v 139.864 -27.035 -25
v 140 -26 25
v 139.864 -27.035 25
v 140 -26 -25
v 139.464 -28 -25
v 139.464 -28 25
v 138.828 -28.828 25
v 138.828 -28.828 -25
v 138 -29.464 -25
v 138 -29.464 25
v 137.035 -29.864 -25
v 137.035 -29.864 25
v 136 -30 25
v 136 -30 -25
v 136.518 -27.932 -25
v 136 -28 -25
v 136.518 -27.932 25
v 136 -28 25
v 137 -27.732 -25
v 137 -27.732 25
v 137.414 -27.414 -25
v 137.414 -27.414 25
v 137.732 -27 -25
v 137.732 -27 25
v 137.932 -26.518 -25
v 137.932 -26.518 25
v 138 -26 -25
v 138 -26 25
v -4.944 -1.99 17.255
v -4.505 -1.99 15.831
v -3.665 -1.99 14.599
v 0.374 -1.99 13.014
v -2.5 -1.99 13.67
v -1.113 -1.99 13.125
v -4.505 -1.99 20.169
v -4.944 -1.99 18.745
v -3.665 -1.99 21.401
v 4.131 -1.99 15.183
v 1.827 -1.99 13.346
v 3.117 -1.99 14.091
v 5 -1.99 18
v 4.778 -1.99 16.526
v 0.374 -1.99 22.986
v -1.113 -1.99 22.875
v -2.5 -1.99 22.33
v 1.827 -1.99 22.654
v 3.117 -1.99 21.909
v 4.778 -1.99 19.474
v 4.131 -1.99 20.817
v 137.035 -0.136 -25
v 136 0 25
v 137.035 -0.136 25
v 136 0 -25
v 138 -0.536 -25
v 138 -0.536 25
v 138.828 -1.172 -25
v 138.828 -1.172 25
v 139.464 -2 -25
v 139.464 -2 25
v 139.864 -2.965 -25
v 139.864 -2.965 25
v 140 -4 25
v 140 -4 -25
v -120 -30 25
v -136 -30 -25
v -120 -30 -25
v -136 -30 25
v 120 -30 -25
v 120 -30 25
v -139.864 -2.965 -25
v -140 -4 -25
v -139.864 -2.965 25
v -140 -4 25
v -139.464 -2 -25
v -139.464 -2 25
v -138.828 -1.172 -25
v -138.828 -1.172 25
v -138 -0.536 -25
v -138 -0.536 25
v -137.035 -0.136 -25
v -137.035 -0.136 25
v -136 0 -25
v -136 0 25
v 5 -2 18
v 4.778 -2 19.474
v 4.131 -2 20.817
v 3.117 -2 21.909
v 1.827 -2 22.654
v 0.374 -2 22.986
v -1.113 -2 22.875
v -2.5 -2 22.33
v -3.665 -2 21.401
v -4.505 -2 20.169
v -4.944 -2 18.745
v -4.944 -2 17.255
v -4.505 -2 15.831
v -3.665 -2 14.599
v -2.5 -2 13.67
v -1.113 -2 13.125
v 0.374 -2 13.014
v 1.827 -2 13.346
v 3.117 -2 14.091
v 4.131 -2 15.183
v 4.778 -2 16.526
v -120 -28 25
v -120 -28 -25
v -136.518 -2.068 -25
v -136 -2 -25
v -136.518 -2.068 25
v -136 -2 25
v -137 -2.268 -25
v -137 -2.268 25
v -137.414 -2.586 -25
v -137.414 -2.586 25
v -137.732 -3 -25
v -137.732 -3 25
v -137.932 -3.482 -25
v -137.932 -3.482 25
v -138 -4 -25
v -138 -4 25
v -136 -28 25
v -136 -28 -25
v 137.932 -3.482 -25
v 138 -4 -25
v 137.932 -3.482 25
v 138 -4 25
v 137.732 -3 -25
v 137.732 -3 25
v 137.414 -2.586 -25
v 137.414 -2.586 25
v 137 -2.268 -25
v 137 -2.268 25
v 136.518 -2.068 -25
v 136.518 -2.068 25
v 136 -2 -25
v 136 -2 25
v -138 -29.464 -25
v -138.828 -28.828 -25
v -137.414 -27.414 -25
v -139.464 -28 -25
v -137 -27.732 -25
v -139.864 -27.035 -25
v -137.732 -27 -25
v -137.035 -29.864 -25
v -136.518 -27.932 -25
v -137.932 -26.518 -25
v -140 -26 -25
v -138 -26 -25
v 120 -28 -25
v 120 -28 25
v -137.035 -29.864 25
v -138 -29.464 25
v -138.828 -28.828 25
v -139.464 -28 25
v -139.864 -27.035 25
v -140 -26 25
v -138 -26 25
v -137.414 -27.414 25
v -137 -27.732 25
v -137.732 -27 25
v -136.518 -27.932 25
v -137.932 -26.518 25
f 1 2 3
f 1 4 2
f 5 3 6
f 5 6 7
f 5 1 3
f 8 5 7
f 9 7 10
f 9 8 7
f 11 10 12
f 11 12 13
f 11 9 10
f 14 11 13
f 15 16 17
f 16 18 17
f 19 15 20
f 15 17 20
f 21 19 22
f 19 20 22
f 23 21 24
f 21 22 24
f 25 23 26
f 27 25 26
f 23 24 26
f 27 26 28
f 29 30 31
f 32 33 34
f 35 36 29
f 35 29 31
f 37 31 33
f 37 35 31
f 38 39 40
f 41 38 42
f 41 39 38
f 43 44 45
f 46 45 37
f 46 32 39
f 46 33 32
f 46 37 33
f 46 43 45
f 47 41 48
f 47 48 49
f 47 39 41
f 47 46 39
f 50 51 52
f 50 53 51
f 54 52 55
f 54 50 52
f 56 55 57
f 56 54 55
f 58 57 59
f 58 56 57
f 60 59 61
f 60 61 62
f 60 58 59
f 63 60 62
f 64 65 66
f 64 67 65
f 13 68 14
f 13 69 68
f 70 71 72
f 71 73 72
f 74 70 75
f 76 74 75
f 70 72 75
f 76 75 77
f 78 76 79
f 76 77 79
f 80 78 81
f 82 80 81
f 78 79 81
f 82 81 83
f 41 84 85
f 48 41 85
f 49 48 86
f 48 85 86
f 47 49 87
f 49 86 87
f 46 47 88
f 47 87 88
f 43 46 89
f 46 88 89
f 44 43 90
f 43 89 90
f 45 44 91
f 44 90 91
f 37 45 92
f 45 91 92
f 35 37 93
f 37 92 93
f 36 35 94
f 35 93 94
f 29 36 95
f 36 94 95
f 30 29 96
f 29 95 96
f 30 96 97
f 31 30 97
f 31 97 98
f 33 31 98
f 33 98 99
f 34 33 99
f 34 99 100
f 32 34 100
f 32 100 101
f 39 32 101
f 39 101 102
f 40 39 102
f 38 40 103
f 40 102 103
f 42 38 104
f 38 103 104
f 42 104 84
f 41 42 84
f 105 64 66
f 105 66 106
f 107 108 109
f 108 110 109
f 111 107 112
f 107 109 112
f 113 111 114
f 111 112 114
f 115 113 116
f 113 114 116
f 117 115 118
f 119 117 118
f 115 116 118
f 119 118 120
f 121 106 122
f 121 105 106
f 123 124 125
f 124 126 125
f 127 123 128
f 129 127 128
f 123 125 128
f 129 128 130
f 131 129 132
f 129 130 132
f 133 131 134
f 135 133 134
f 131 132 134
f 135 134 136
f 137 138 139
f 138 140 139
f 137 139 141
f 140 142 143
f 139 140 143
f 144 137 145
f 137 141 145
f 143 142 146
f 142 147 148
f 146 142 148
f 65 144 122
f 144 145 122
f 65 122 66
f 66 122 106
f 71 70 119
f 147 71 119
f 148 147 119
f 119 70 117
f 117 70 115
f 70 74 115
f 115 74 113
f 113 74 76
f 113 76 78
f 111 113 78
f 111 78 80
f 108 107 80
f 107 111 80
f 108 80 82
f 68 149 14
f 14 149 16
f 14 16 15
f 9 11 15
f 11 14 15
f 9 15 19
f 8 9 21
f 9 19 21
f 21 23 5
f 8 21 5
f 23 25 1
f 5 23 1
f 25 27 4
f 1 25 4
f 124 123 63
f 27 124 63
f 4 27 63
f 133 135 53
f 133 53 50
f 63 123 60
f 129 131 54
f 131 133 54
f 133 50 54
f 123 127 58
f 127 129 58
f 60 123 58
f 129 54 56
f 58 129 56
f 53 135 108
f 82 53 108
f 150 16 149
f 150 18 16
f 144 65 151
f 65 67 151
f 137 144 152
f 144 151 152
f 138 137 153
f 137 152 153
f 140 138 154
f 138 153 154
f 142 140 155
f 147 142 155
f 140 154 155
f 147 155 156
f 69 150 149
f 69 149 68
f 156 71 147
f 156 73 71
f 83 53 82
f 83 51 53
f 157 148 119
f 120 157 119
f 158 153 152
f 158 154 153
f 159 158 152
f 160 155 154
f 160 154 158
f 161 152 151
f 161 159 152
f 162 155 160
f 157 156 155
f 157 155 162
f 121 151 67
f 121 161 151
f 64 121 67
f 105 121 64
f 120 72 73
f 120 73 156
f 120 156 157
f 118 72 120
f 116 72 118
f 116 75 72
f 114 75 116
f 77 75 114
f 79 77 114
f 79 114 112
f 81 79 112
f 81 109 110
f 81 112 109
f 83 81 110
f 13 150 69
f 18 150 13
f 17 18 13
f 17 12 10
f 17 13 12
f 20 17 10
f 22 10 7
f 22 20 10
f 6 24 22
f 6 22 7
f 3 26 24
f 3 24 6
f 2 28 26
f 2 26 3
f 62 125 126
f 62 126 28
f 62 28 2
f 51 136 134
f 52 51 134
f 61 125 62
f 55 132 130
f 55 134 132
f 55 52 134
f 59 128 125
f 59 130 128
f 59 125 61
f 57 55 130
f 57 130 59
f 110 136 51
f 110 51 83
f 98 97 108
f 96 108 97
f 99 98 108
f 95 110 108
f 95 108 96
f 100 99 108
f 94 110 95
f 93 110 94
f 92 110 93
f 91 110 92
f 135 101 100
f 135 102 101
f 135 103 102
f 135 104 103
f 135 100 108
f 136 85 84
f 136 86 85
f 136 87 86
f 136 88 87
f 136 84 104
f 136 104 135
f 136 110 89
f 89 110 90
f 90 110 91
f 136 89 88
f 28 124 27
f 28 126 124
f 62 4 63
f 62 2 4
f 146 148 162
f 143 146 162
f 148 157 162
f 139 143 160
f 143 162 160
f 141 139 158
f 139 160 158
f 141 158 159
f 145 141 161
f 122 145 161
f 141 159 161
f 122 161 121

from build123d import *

# Parameters (mm, degrees)
F1_DEPTH = 25
F2_R     = 2
F3_R     = 4
F4_R     = 5
F5_DEPTH = 0.01


with BuildPart() as f1:
    # F0 (on Top) → F1 (new body, symmetric)
    with BuildSketch(Plane.XY):
        Polygon((140, 0), (0, 0), (-140, 0), (-140, -30), (-120, -30), (-120, -28), (-138, -28), (-138, -2), (0, -2), (138, -2), (138, -28), (120, -28), (120, -30), (140, -30), align=None)
    extrude(amount=F1_DEPTH, both=True)

    # F2
    f2_edges = [f1.edges().sort_by_distance(p)[0] for p in [
        (-138, -28, 0),
        (-138, -2, 0),
        (138, -28, 0),
        (138, -2, 0),
    ]]
    fillet(f2_edges, radius=F2_R)

    # F3
    f3_edges = [f1.edges().sort_by_distance(p)[0] for p in [
        (-140, -30, 0),
        (-140, 0, 0),
        (140, -30, 0),
        (140, 0, 0),
    ]]
    fillet(f3_edges, radius=F3_R)

    # F4 (on face) → F5 (cut)
    with BuildSketch(Plane.XZ.offset(2)):
        with Locations((0, 18)):
            Circle(F4_R)
    extrude(amount=-F5_DEPTH, mode=Mode.SUBTRACT)


solid = f1.part
